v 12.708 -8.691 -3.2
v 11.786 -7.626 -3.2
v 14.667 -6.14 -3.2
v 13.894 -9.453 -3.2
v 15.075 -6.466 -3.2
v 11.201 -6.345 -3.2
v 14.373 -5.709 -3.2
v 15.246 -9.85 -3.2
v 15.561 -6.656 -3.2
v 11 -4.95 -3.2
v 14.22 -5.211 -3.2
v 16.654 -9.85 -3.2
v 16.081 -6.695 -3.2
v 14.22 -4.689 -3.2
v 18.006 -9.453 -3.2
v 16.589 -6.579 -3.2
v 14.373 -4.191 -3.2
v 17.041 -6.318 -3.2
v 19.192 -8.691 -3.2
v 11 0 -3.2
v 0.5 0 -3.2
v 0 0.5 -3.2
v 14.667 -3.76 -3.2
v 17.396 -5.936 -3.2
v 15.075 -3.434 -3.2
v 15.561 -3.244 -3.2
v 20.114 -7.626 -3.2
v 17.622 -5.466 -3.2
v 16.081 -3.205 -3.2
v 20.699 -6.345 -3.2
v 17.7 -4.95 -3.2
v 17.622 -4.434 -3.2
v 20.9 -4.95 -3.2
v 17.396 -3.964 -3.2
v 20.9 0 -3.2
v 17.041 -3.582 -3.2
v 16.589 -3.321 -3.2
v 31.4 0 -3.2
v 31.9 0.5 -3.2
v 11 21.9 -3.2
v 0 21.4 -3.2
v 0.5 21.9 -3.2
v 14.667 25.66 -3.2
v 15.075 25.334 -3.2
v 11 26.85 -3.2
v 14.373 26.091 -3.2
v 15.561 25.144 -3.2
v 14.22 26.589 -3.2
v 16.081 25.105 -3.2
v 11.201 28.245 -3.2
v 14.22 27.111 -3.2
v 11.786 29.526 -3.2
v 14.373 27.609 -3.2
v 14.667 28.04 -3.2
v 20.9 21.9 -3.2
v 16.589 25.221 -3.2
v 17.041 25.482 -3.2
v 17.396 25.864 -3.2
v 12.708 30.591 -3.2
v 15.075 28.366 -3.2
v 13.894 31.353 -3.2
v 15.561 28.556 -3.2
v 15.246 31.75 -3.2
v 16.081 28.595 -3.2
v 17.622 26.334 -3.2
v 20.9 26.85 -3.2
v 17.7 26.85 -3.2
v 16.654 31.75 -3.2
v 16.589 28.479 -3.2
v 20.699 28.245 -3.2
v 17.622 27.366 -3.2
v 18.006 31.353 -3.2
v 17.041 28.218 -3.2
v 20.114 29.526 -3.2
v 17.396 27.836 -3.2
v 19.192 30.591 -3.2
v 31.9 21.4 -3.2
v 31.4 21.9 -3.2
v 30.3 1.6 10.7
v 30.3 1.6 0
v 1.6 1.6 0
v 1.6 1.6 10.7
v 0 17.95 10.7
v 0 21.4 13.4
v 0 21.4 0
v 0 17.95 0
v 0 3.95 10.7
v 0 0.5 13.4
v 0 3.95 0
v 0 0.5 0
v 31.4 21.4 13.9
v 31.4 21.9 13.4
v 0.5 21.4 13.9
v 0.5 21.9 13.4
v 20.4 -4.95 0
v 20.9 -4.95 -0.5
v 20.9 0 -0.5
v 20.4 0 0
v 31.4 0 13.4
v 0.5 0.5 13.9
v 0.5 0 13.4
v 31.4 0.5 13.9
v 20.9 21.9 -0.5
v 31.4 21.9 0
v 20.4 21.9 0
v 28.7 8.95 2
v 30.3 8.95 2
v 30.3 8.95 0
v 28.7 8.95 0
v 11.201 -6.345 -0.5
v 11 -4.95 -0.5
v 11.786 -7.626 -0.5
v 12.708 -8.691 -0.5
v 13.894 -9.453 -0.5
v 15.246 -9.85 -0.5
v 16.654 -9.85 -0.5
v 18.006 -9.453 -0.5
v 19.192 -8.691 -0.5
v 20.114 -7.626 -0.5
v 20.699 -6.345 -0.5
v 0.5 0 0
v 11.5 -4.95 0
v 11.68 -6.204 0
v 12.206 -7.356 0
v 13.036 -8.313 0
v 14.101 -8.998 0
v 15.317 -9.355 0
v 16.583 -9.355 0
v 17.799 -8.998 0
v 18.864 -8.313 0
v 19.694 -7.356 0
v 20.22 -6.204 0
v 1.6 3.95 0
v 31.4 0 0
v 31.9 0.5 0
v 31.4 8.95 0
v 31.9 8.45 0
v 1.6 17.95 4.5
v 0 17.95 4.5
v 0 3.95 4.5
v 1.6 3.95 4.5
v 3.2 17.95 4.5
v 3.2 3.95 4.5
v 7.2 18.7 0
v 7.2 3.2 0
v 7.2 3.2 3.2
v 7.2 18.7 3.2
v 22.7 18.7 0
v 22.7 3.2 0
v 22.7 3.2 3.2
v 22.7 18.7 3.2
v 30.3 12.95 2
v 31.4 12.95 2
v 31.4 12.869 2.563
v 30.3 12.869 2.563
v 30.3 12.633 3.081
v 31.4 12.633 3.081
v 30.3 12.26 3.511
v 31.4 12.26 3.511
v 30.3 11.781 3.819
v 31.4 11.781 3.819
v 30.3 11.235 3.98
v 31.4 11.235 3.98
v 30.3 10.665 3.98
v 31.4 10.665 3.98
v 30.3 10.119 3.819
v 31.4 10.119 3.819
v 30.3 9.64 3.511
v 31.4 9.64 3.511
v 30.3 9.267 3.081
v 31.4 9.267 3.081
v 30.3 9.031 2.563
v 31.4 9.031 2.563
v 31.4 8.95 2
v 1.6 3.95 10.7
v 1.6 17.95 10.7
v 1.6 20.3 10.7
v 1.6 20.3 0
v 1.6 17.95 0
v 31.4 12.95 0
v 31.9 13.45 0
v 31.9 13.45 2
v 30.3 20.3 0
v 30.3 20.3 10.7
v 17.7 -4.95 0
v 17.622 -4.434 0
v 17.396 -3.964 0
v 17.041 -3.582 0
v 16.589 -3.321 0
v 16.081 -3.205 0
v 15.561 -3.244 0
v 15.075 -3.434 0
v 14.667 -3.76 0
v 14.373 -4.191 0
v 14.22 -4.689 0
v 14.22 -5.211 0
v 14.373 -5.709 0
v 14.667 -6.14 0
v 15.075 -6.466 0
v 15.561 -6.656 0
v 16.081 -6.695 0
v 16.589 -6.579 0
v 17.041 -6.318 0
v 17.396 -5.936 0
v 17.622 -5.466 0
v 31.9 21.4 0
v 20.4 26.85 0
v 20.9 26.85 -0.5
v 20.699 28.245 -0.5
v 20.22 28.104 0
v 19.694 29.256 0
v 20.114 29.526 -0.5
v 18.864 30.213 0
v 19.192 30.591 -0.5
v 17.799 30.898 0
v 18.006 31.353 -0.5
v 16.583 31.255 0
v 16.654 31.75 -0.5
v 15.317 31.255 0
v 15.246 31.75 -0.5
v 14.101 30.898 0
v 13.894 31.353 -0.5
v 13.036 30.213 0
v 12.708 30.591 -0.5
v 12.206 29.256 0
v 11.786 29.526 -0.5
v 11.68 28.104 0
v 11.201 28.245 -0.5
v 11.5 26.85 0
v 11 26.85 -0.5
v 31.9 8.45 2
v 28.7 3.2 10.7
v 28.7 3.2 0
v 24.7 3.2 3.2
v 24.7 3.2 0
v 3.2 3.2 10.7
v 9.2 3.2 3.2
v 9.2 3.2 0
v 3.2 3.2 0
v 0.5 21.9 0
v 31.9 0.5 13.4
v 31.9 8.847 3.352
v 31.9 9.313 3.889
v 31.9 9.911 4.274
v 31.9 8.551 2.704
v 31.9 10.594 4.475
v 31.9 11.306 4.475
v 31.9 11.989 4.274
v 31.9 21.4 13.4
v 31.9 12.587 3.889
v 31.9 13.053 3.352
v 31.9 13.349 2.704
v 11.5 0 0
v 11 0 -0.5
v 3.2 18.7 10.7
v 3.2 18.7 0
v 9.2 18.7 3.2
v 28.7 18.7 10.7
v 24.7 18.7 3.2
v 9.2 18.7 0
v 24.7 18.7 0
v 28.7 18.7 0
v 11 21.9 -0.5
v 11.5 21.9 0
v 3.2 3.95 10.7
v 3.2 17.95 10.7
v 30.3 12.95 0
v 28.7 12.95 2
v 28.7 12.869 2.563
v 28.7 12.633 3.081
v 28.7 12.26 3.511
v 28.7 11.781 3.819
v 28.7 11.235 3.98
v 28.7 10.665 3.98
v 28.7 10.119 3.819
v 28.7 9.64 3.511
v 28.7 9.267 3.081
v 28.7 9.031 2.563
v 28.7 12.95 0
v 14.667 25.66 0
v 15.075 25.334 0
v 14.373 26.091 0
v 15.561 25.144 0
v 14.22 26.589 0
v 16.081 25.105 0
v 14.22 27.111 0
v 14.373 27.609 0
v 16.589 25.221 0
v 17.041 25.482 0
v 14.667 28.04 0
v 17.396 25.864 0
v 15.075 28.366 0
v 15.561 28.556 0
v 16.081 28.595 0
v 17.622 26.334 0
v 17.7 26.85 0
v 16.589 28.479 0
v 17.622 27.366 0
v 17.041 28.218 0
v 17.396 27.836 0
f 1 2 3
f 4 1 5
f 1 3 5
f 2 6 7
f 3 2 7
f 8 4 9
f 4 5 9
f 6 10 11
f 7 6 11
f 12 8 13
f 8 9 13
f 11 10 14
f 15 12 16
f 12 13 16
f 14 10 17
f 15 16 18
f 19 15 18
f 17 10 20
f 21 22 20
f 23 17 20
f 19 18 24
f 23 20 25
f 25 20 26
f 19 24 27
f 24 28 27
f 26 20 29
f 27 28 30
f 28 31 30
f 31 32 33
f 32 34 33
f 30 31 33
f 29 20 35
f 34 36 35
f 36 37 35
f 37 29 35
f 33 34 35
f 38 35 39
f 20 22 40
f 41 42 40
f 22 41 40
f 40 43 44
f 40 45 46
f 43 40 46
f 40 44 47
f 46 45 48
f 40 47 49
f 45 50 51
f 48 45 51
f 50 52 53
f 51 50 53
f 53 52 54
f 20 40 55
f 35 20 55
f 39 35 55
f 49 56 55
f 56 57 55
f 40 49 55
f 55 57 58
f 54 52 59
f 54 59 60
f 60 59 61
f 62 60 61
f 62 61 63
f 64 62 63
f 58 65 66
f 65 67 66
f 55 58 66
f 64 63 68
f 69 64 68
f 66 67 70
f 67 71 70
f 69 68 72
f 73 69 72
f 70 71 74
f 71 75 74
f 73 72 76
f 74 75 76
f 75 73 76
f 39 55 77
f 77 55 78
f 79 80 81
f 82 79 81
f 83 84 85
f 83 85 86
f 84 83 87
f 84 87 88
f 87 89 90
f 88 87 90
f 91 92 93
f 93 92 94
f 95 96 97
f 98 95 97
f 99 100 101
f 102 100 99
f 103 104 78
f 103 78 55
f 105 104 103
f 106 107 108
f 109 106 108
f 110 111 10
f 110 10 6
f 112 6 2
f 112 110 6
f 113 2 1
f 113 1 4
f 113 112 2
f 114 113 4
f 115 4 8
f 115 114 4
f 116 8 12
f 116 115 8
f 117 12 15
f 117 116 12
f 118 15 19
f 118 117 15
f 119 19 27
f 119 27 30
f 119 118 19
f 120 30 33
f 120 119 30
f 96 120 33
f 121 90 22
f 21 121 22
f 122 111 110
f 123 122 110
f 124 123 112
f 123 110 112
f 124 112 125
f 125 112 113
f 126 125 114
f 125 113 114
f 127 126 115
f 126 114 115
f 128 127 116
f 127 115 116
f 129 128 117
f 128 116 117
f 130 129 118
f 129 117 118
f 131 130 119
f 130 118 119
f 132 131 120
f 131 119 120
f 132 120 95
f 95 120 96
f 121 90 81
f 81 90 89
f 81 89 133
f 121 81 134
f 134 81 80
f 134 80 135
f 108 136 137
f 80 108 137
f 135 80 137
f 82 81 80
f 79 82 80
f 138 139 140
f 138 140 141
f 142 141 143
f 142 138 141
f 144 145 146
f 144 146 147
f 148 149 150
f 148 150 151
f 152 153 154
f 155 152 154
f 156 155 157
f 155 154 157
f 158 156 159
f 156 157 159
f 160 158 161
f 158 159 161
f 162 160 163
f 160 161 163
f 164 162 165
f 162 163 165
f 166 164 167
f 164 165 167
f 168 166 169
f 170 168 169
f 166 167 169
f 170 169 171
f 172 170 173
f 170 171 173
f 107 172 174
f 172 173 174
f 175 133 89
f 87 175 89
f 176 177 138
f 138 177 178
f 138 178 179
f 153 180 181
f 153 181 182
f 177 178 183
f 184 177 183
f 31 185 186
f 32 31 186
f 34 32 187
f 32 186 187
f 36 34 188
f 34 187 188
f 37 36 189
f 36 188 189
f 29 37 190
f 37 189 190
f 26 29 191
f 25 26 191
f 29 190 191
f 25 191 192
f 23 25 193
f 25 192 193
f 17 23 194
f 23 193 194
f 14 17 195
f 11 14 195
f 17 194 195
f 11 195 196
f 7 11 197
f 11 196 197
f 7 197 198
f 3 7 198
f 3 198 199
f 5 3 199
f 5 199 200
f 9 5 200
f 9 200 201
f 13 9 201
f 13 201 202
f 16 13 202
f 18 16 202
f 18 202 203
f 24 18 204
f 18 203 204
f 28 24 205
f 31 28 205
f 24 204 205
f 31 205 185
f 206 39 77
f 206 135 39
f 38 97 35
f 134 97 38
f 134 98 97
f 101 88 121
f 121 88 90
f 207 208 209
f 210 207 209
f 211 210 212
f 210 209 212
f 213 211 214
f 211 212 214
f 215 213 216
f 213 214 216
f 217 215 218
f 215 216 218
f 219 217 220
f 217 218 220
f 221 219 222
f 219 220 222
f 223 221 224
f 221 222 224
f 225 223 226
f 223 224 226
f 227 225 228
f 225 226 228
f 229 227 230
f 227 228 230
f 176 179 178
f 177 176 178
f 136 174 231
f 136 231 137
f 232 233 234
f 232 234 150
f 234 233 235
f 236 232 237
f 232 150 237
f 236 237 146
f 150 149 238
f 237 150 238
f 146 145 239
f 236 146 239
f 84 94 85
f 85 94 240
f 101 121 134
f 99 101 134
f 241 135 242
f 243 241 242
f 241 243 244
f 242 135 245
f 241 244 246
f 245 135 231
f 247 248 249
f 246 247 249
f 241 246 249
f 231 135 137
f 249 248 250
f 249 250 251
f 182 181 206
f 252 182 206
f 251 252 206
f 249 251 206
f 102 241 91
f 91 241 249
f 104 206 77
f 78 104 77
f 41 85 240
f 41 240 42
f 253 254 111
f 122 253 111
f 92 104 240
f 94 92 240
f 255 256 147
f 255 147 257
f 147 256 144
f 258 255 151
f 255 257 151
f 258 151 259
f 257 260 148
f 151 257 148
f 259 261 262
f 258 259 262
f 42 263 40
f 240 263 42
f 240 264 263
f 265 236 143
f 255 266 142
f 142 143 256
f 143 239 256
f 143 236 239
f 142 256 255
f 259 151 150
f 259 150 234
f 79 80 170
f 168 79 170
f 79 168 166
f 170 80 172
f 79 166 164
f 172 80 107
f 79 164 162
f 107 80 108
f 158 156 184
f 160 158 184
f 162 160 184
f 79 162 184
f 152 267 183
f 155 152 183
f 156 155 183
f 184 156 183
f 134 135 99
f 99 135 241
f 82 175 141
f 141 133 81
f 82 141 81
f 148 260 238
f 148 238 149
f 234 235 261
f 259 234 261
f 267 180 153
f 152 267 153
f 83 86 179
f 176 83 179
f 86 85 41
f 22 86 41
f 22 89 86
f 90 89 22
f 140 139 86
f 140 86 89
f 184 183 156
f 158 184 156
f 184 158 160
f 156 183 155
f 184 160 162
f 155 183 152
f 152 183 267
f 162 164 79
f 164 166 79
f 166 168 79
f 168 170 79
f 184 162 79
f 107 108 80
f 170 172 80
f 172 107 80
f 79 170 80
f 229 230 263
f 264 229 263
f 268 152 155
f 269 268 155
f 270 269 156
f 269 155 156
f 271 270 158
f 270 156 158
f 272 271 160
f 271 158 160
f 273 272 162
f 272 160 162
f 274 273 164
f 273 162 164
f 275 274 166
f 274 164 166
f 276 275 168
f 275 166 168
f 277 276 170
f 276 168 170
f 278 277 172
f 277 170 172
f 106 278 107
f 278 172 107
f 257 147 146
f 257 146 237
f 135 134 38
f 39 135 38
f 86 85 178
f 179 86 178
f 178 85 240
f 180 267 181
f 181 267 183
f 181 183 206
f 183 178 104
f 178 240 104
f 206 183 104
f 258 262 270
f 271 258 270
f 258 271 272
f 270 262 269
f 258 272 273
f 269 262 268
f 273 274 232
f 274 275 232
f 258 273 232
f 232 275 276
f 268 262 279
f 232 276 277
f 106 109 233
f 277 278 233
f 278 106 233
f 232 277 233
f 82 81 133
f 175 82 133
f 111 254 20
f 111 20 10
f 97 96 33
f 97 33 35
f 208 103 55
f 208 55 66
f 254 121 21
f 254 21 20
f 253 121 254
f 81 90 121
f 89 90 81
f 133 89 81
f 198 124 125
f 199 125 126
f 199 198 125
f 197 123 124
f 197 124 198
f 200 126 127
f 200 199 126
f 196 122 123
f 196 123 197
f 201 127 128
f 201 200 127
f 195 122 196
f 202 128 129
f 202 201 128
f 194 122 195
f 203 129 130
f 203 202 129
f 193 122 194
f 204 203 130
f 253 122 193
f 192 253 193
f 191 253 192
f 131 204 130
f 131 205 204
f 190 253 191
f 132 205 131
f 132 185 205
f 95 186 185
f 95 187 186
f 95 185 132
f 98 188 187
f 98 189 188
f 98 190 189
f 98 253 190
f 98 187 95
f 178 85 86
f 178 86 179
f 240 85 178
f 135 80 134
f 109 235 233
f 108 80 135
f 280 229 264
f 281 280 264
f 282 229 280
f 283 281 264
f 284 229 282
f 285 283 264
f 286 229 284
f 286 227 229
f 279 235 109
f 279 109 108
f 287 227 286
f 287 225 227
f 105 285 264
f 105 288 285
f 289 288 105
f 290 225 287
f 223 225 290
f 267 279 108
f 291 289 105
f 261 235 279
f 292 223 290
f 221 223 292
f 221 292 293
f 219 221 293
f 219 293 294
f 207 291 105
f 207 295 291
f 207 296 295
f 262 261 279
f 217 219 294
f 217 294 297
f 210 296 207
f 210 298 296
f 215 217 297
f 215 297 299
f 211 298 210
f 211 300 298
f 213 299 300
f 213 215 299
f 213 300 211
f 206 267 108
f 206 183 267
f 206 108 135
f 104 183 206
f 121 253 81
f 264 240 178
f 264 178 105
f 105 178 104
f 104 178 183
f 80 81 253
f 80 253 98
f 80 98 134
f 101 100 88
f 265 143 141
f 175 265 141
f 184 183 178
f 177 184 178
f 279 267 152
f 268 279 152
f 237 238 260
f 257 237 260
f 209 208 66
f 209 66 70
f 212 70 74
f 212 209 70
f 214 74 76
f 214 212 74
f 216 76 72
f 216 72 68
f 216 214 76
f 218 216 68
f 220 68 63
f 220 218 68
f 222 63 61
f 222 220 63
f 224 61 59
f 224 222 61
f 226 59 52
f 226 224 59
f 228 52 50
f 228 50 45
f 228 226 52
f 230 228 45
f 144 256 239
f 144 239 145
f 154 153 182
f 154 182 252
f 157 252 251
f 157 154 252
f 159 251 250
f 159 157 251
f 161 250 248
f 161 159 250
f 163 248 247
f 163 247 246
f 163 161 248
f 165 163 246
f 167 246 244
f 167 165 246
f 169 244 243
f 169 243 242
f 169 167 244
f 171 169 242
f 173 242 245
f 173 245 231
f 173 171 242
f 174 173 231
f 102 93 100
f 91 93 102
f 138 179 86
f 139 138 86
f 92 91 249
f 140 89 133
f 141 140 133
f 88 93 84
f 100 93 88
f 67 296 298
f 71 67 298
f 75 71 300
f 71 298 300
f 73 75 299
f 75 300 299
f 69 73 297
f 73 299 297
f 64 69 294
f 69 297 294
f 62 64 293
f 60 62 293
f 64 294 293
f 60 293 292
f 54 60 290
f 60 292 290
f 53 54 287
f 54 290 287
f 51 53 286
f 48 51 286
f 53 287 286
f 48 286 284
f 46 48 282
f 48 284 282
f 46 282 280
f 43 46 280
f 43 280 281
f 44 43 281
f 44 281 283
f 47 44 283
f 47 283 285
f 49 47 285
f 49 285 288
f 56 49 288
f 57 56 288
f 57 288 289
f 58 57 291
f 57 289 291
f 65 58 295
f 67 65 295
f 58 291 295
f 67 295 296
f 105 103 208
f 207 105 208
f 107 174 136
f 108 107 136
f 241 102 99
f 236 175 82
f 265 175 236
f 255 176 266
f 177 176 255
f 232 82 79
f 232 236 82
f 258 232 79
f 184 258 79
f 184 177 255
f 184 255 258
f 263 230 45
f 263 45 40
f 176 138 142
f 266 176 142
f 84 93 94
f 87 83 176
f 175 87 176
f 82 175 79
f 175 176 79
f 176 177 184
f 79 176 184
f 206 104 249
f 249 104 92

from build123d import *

# Parameters (mm, degrees)
F2_W       = 2
F2_H       = 15.5
F2_W_2     = 13.5
F2_W_3     = 1.6
F2_H_2     = 14
F2_W_4     = 4
F2_R       = 1.75
F3_DEPTH   = 3.2
F4_DEPTH   = 3.2
F5_DEPTH   = 4.5
F6_DEPTH   = 10.7
F7_DEPTH   = 10.7
F8_START   = 10.7
F8_DEPTH   = 3.2
F10_DEPTH  = 3.2
F11_SIZE   = 0.5
F11_2_SIZE = 0.5


with BuildPart() as f3:
    # F2 (on Top) → F3 (new body)
    with BuildSketch(Plane.XY):
        Polygon((7.2, 3.2), (3.2, 3.2), (3.2, 3.95), (1.6, 3.95), (1.6, 1.6), (30.3, 1.6), (30.3, 20.3), (1.6, 20.3), (1.6, 17.95), (3.2, 17.95), (3.2, 18.7), (7.2, 18.7), (9.2, 18.7), (22.7, 18.7), (24.7, 18.7), (28.7, 18.7), (28.7, 3.2), (24.7, 3.2), (22.7, 3.2), (9.2, 3.2), align=None)
        Polygon((3.2, 3.95), (3.2, 3.2), (7.2, 3.2), (7.2, 18.7), (3.2, 18.7), (3.2, 17.95), align=None)
        with Locations((23.7, 10.95)):
            Rectangle(F2_W, F2_H)
        with Locations((15.95, 10.95)):
            Rectangle(F2_W_2, F2_H)
        with Locations((2.4, 10.95)):
            Rectangle(F2_W_3, F2_H_2)
        with Locations((0.8, 10.95)):
            Rectangle(F2_W_3, F2_H_2)
        with Locations((26.7, 10.95)):
            Rectangle(F2_W_4, F2_H)
        with Locations((8.2, 10.95)):
            Rectangle(F2_W, F2_H)
        Polygon((1.6, 1.6), (1.6, 3.95), (0, 3.95), (0, 0), (11, 0), (20.9, 0), (31.9, 0), (31.9, 21.9), (20.9, 21.9), (11, 21.9), (0, 21.9), (0, 17.95), (1.6, 17.95), (1.6, 20.3), (30.3, 20.3), (30.3, 1.6), align=None)
        with BuildLine():
            Line((11, 26.85), (11, 21.9))
            Line((11, 21.9), (20.9, 21.9))
            Line((20.9, 21.9), (20.9, 26.85))
            ThreePointArc((20.9, 26.85), (15.95, 31.8), (11, 26.85))
        make_face()
        with Locations((15.95, 26.85)):
            Circle(F2_R, mode=Mode.SUBTRACT)
        with BuildLine():
            Line((20.9, 0), (11, 0))
            Line((11, 0), (11, -4.95))
            ThreePointArc((11, -4.95), (15.95, -9.9), (20.9, -4.95))
            Line((20.9, -4.95), (20.9, 0))
        make_face()
        with Locations((15.95, -4.95)):
            Circle(F2_R, mode=Mode.SUBTRACT)
    extrude(amount=-F3_DEPTH)

    # F2 (on Top) → F4 (join)
    with BuildSketch(Plane.XY):
        with Locations((8.2, 10.95)):
            Rectangle(F2_W, F2_H)
        with Locations((23.7, 10.95)):
            Rectangle(F2_W, F2_H)
    extrude(amount=F4_DEPTH)

    # F2 (on Top) → F5 (join)
    with BuildSketch(Plane.XY):
        with Locations((0.8, 10.95)):
            Rectangle(F2_W_3, F2_H_2)
        with Locations((2.4, 10.95)):
            Rectangle(F2_W_3, F2_H_2)
    extrude(amount=F5_DEPTH)

    # F2 (on Top) → F6 (join)
    with BuildSketch(Plane.XY):
        Polygon((7.2, 3.2), (3.2, 3.2), (3.2, 3.95), (1.6, 3.95), (1.6, 1.6), (30.3, 1.6), (30.3, 20.3), (1.6, 20.3), (1.6, 17.95), (3.2, 17.95), (3.2, 18.7), (7.2, 18.7), (9.2, 18.7), (22.7, 18.7), (24.7, 18.7), (28.7, 18.7), (28.7, 3.2), (24.7, 3.2), (22.7, 3.2), (9.2, 3.2), align=None)
    extrude(amount=F6_DEPTH)


with BuildPart() as f7:
    # F2 (on Top) → F7 (new body)
    with BuildSketch(Plane.XY):
        Polygon((1.6, 1.6), (1.6, 3.95), (0, 3.95), (0, 0), (11, 0), (20.9, 0), (31.9, 0), (31.9, 21.9), (20.9, 21.9), (11, 21.9), (0, 21.9), (0, 17.95), (1.6, 17.95), (1.6, 20.3), (30.3, 20.3), (30.3, 1.6), align=None)
    extrude(amount=F7_DEPTH)

    # F2 (on Top) → F8 (join)
    with BuildSketch(Plane.XY.offset(F8_START)):
        with Locations((0.8, 10.95)):
            Rectangle(F2_W_3, F2_H_2)
        Polygon((1.6, 1.6), (1.6, 3.95), (0, 3.95), (0, 0), (11, 0), (20.9, 0), (31.9, 0), (31.9, 21.9), (20.9, 21.9), (11, 21.9), (0, 21.9), (0, 17.95), (1.6, 17.95), (1.6, 20.3), (30.3, 20.3), (30.3, 1.6), align=None)
        with Locations((8.2, 10.95)):
            Rectangle(F2_W, F2_H)
        with Locations((15.95, 10.95)):
            Rectangle(F2_W_2, F2_H)
        with Locations((23.7, 10.95)):
            Rectangle(F2_W, F2_H)
        Polygon((7.2, 3.2), (3.2, 3.2), (3.2, 3.95), (1.6, 3.95), (1.6, 1.6), (30.3, 1.6), (30.3, 20.3), (1.6, 20.3), (1.6, 17.95), (3.2, 17.95), (3.2, 18.7), (7.2, 18.7), (9.2, 18.7), (22.7, 18.7), (24.7, 18.7), (28.7, 18.7), (28.7, 3.2), (24.7, 3.2), (22.7, 3.2), (9.2, 3.2), align=None)
        with Locations((26.7, 10.95)):
            Rectangle(F2_W_4, F2_H)
        Polygon((3.2, 3.95), (3.2, 3.2), (7.2, 3.2), (7.2, 18.7), (3.2, 18.7), (3.2, 17.95), align=None)
        with Locations((2.4, 10.95)):
            Rectangle(F2_W_3, F2_H_2)
    extrude(amount=F8_DEPTH)


with BuildPart() as f10_tool:
    # F9 (on face) → F10 (new body, through all)
    with BuildSketch(Plane.YZ.offset(31.9)):
        with BuildLine():
            Line((12.95, 0), (12.95, 2))
            ThreePointArc((12.95, 2), (10.95, 4), (8.95, 2))
            Line((8.95, 2), (8.95, 0))
            Line((8.95, 0), (12.95, 0))
        make_face()
    extrude(amount=-F10_DEPTH)


with BuildPart() as f3_1:
    add(f3.part)

    # F10: cut by f10_tool
    add(f10_tool.part, mode=Mode.SUBTRACT)

    # F11
    f11_edges = [f3_1.edges().sort_by_distance(p)[0] for p in [
        (0, 21.9, -1.6),
        (0, 0, -1.6),
        (31.9, 0, -1.6),
        (31.9, 21.9, -1.6),
        (15.95, 31.8, 0),
        (15.95, -9.9, 0),
        (11, 24.375, 0),
        (20.9, 24.375, 0),
        (20.9, -2.475, 0),
        (11, -2.475, 0),
    ]]
    chamfer(f11_edges, length=F11_SIZE)


with BuildPart() as f7_1:
    add(f7.part)

    # F10: cut by f10_tool
    add(f10_tool.part, mode=Mode.SUBTRACT)

    # F11#2
    f11_2_edges = [f7_1.edges().sort_by_distance(p)[0] for p in [
        (15.95, 0, 13.9),
        (31.9, 10.95, 13.9),
        (15.95, 21.9, 13.9),
        (0, 10.95, 13.9),
        (0, 21.9, 6.95),
        (0, 0, 6.95),
        (31.9, 0, 6.95),
        (31.9, 21.9, 6.95),
        (31.9, 12.95, 1),
        (31.9, 8.95, 1),
        (31.9, 10.95, 4),
    ]]
    chamfer(f11_2_edges, length=F11_2_SIZE)


solid = Compound([f3_1.part, f7_1.part])
